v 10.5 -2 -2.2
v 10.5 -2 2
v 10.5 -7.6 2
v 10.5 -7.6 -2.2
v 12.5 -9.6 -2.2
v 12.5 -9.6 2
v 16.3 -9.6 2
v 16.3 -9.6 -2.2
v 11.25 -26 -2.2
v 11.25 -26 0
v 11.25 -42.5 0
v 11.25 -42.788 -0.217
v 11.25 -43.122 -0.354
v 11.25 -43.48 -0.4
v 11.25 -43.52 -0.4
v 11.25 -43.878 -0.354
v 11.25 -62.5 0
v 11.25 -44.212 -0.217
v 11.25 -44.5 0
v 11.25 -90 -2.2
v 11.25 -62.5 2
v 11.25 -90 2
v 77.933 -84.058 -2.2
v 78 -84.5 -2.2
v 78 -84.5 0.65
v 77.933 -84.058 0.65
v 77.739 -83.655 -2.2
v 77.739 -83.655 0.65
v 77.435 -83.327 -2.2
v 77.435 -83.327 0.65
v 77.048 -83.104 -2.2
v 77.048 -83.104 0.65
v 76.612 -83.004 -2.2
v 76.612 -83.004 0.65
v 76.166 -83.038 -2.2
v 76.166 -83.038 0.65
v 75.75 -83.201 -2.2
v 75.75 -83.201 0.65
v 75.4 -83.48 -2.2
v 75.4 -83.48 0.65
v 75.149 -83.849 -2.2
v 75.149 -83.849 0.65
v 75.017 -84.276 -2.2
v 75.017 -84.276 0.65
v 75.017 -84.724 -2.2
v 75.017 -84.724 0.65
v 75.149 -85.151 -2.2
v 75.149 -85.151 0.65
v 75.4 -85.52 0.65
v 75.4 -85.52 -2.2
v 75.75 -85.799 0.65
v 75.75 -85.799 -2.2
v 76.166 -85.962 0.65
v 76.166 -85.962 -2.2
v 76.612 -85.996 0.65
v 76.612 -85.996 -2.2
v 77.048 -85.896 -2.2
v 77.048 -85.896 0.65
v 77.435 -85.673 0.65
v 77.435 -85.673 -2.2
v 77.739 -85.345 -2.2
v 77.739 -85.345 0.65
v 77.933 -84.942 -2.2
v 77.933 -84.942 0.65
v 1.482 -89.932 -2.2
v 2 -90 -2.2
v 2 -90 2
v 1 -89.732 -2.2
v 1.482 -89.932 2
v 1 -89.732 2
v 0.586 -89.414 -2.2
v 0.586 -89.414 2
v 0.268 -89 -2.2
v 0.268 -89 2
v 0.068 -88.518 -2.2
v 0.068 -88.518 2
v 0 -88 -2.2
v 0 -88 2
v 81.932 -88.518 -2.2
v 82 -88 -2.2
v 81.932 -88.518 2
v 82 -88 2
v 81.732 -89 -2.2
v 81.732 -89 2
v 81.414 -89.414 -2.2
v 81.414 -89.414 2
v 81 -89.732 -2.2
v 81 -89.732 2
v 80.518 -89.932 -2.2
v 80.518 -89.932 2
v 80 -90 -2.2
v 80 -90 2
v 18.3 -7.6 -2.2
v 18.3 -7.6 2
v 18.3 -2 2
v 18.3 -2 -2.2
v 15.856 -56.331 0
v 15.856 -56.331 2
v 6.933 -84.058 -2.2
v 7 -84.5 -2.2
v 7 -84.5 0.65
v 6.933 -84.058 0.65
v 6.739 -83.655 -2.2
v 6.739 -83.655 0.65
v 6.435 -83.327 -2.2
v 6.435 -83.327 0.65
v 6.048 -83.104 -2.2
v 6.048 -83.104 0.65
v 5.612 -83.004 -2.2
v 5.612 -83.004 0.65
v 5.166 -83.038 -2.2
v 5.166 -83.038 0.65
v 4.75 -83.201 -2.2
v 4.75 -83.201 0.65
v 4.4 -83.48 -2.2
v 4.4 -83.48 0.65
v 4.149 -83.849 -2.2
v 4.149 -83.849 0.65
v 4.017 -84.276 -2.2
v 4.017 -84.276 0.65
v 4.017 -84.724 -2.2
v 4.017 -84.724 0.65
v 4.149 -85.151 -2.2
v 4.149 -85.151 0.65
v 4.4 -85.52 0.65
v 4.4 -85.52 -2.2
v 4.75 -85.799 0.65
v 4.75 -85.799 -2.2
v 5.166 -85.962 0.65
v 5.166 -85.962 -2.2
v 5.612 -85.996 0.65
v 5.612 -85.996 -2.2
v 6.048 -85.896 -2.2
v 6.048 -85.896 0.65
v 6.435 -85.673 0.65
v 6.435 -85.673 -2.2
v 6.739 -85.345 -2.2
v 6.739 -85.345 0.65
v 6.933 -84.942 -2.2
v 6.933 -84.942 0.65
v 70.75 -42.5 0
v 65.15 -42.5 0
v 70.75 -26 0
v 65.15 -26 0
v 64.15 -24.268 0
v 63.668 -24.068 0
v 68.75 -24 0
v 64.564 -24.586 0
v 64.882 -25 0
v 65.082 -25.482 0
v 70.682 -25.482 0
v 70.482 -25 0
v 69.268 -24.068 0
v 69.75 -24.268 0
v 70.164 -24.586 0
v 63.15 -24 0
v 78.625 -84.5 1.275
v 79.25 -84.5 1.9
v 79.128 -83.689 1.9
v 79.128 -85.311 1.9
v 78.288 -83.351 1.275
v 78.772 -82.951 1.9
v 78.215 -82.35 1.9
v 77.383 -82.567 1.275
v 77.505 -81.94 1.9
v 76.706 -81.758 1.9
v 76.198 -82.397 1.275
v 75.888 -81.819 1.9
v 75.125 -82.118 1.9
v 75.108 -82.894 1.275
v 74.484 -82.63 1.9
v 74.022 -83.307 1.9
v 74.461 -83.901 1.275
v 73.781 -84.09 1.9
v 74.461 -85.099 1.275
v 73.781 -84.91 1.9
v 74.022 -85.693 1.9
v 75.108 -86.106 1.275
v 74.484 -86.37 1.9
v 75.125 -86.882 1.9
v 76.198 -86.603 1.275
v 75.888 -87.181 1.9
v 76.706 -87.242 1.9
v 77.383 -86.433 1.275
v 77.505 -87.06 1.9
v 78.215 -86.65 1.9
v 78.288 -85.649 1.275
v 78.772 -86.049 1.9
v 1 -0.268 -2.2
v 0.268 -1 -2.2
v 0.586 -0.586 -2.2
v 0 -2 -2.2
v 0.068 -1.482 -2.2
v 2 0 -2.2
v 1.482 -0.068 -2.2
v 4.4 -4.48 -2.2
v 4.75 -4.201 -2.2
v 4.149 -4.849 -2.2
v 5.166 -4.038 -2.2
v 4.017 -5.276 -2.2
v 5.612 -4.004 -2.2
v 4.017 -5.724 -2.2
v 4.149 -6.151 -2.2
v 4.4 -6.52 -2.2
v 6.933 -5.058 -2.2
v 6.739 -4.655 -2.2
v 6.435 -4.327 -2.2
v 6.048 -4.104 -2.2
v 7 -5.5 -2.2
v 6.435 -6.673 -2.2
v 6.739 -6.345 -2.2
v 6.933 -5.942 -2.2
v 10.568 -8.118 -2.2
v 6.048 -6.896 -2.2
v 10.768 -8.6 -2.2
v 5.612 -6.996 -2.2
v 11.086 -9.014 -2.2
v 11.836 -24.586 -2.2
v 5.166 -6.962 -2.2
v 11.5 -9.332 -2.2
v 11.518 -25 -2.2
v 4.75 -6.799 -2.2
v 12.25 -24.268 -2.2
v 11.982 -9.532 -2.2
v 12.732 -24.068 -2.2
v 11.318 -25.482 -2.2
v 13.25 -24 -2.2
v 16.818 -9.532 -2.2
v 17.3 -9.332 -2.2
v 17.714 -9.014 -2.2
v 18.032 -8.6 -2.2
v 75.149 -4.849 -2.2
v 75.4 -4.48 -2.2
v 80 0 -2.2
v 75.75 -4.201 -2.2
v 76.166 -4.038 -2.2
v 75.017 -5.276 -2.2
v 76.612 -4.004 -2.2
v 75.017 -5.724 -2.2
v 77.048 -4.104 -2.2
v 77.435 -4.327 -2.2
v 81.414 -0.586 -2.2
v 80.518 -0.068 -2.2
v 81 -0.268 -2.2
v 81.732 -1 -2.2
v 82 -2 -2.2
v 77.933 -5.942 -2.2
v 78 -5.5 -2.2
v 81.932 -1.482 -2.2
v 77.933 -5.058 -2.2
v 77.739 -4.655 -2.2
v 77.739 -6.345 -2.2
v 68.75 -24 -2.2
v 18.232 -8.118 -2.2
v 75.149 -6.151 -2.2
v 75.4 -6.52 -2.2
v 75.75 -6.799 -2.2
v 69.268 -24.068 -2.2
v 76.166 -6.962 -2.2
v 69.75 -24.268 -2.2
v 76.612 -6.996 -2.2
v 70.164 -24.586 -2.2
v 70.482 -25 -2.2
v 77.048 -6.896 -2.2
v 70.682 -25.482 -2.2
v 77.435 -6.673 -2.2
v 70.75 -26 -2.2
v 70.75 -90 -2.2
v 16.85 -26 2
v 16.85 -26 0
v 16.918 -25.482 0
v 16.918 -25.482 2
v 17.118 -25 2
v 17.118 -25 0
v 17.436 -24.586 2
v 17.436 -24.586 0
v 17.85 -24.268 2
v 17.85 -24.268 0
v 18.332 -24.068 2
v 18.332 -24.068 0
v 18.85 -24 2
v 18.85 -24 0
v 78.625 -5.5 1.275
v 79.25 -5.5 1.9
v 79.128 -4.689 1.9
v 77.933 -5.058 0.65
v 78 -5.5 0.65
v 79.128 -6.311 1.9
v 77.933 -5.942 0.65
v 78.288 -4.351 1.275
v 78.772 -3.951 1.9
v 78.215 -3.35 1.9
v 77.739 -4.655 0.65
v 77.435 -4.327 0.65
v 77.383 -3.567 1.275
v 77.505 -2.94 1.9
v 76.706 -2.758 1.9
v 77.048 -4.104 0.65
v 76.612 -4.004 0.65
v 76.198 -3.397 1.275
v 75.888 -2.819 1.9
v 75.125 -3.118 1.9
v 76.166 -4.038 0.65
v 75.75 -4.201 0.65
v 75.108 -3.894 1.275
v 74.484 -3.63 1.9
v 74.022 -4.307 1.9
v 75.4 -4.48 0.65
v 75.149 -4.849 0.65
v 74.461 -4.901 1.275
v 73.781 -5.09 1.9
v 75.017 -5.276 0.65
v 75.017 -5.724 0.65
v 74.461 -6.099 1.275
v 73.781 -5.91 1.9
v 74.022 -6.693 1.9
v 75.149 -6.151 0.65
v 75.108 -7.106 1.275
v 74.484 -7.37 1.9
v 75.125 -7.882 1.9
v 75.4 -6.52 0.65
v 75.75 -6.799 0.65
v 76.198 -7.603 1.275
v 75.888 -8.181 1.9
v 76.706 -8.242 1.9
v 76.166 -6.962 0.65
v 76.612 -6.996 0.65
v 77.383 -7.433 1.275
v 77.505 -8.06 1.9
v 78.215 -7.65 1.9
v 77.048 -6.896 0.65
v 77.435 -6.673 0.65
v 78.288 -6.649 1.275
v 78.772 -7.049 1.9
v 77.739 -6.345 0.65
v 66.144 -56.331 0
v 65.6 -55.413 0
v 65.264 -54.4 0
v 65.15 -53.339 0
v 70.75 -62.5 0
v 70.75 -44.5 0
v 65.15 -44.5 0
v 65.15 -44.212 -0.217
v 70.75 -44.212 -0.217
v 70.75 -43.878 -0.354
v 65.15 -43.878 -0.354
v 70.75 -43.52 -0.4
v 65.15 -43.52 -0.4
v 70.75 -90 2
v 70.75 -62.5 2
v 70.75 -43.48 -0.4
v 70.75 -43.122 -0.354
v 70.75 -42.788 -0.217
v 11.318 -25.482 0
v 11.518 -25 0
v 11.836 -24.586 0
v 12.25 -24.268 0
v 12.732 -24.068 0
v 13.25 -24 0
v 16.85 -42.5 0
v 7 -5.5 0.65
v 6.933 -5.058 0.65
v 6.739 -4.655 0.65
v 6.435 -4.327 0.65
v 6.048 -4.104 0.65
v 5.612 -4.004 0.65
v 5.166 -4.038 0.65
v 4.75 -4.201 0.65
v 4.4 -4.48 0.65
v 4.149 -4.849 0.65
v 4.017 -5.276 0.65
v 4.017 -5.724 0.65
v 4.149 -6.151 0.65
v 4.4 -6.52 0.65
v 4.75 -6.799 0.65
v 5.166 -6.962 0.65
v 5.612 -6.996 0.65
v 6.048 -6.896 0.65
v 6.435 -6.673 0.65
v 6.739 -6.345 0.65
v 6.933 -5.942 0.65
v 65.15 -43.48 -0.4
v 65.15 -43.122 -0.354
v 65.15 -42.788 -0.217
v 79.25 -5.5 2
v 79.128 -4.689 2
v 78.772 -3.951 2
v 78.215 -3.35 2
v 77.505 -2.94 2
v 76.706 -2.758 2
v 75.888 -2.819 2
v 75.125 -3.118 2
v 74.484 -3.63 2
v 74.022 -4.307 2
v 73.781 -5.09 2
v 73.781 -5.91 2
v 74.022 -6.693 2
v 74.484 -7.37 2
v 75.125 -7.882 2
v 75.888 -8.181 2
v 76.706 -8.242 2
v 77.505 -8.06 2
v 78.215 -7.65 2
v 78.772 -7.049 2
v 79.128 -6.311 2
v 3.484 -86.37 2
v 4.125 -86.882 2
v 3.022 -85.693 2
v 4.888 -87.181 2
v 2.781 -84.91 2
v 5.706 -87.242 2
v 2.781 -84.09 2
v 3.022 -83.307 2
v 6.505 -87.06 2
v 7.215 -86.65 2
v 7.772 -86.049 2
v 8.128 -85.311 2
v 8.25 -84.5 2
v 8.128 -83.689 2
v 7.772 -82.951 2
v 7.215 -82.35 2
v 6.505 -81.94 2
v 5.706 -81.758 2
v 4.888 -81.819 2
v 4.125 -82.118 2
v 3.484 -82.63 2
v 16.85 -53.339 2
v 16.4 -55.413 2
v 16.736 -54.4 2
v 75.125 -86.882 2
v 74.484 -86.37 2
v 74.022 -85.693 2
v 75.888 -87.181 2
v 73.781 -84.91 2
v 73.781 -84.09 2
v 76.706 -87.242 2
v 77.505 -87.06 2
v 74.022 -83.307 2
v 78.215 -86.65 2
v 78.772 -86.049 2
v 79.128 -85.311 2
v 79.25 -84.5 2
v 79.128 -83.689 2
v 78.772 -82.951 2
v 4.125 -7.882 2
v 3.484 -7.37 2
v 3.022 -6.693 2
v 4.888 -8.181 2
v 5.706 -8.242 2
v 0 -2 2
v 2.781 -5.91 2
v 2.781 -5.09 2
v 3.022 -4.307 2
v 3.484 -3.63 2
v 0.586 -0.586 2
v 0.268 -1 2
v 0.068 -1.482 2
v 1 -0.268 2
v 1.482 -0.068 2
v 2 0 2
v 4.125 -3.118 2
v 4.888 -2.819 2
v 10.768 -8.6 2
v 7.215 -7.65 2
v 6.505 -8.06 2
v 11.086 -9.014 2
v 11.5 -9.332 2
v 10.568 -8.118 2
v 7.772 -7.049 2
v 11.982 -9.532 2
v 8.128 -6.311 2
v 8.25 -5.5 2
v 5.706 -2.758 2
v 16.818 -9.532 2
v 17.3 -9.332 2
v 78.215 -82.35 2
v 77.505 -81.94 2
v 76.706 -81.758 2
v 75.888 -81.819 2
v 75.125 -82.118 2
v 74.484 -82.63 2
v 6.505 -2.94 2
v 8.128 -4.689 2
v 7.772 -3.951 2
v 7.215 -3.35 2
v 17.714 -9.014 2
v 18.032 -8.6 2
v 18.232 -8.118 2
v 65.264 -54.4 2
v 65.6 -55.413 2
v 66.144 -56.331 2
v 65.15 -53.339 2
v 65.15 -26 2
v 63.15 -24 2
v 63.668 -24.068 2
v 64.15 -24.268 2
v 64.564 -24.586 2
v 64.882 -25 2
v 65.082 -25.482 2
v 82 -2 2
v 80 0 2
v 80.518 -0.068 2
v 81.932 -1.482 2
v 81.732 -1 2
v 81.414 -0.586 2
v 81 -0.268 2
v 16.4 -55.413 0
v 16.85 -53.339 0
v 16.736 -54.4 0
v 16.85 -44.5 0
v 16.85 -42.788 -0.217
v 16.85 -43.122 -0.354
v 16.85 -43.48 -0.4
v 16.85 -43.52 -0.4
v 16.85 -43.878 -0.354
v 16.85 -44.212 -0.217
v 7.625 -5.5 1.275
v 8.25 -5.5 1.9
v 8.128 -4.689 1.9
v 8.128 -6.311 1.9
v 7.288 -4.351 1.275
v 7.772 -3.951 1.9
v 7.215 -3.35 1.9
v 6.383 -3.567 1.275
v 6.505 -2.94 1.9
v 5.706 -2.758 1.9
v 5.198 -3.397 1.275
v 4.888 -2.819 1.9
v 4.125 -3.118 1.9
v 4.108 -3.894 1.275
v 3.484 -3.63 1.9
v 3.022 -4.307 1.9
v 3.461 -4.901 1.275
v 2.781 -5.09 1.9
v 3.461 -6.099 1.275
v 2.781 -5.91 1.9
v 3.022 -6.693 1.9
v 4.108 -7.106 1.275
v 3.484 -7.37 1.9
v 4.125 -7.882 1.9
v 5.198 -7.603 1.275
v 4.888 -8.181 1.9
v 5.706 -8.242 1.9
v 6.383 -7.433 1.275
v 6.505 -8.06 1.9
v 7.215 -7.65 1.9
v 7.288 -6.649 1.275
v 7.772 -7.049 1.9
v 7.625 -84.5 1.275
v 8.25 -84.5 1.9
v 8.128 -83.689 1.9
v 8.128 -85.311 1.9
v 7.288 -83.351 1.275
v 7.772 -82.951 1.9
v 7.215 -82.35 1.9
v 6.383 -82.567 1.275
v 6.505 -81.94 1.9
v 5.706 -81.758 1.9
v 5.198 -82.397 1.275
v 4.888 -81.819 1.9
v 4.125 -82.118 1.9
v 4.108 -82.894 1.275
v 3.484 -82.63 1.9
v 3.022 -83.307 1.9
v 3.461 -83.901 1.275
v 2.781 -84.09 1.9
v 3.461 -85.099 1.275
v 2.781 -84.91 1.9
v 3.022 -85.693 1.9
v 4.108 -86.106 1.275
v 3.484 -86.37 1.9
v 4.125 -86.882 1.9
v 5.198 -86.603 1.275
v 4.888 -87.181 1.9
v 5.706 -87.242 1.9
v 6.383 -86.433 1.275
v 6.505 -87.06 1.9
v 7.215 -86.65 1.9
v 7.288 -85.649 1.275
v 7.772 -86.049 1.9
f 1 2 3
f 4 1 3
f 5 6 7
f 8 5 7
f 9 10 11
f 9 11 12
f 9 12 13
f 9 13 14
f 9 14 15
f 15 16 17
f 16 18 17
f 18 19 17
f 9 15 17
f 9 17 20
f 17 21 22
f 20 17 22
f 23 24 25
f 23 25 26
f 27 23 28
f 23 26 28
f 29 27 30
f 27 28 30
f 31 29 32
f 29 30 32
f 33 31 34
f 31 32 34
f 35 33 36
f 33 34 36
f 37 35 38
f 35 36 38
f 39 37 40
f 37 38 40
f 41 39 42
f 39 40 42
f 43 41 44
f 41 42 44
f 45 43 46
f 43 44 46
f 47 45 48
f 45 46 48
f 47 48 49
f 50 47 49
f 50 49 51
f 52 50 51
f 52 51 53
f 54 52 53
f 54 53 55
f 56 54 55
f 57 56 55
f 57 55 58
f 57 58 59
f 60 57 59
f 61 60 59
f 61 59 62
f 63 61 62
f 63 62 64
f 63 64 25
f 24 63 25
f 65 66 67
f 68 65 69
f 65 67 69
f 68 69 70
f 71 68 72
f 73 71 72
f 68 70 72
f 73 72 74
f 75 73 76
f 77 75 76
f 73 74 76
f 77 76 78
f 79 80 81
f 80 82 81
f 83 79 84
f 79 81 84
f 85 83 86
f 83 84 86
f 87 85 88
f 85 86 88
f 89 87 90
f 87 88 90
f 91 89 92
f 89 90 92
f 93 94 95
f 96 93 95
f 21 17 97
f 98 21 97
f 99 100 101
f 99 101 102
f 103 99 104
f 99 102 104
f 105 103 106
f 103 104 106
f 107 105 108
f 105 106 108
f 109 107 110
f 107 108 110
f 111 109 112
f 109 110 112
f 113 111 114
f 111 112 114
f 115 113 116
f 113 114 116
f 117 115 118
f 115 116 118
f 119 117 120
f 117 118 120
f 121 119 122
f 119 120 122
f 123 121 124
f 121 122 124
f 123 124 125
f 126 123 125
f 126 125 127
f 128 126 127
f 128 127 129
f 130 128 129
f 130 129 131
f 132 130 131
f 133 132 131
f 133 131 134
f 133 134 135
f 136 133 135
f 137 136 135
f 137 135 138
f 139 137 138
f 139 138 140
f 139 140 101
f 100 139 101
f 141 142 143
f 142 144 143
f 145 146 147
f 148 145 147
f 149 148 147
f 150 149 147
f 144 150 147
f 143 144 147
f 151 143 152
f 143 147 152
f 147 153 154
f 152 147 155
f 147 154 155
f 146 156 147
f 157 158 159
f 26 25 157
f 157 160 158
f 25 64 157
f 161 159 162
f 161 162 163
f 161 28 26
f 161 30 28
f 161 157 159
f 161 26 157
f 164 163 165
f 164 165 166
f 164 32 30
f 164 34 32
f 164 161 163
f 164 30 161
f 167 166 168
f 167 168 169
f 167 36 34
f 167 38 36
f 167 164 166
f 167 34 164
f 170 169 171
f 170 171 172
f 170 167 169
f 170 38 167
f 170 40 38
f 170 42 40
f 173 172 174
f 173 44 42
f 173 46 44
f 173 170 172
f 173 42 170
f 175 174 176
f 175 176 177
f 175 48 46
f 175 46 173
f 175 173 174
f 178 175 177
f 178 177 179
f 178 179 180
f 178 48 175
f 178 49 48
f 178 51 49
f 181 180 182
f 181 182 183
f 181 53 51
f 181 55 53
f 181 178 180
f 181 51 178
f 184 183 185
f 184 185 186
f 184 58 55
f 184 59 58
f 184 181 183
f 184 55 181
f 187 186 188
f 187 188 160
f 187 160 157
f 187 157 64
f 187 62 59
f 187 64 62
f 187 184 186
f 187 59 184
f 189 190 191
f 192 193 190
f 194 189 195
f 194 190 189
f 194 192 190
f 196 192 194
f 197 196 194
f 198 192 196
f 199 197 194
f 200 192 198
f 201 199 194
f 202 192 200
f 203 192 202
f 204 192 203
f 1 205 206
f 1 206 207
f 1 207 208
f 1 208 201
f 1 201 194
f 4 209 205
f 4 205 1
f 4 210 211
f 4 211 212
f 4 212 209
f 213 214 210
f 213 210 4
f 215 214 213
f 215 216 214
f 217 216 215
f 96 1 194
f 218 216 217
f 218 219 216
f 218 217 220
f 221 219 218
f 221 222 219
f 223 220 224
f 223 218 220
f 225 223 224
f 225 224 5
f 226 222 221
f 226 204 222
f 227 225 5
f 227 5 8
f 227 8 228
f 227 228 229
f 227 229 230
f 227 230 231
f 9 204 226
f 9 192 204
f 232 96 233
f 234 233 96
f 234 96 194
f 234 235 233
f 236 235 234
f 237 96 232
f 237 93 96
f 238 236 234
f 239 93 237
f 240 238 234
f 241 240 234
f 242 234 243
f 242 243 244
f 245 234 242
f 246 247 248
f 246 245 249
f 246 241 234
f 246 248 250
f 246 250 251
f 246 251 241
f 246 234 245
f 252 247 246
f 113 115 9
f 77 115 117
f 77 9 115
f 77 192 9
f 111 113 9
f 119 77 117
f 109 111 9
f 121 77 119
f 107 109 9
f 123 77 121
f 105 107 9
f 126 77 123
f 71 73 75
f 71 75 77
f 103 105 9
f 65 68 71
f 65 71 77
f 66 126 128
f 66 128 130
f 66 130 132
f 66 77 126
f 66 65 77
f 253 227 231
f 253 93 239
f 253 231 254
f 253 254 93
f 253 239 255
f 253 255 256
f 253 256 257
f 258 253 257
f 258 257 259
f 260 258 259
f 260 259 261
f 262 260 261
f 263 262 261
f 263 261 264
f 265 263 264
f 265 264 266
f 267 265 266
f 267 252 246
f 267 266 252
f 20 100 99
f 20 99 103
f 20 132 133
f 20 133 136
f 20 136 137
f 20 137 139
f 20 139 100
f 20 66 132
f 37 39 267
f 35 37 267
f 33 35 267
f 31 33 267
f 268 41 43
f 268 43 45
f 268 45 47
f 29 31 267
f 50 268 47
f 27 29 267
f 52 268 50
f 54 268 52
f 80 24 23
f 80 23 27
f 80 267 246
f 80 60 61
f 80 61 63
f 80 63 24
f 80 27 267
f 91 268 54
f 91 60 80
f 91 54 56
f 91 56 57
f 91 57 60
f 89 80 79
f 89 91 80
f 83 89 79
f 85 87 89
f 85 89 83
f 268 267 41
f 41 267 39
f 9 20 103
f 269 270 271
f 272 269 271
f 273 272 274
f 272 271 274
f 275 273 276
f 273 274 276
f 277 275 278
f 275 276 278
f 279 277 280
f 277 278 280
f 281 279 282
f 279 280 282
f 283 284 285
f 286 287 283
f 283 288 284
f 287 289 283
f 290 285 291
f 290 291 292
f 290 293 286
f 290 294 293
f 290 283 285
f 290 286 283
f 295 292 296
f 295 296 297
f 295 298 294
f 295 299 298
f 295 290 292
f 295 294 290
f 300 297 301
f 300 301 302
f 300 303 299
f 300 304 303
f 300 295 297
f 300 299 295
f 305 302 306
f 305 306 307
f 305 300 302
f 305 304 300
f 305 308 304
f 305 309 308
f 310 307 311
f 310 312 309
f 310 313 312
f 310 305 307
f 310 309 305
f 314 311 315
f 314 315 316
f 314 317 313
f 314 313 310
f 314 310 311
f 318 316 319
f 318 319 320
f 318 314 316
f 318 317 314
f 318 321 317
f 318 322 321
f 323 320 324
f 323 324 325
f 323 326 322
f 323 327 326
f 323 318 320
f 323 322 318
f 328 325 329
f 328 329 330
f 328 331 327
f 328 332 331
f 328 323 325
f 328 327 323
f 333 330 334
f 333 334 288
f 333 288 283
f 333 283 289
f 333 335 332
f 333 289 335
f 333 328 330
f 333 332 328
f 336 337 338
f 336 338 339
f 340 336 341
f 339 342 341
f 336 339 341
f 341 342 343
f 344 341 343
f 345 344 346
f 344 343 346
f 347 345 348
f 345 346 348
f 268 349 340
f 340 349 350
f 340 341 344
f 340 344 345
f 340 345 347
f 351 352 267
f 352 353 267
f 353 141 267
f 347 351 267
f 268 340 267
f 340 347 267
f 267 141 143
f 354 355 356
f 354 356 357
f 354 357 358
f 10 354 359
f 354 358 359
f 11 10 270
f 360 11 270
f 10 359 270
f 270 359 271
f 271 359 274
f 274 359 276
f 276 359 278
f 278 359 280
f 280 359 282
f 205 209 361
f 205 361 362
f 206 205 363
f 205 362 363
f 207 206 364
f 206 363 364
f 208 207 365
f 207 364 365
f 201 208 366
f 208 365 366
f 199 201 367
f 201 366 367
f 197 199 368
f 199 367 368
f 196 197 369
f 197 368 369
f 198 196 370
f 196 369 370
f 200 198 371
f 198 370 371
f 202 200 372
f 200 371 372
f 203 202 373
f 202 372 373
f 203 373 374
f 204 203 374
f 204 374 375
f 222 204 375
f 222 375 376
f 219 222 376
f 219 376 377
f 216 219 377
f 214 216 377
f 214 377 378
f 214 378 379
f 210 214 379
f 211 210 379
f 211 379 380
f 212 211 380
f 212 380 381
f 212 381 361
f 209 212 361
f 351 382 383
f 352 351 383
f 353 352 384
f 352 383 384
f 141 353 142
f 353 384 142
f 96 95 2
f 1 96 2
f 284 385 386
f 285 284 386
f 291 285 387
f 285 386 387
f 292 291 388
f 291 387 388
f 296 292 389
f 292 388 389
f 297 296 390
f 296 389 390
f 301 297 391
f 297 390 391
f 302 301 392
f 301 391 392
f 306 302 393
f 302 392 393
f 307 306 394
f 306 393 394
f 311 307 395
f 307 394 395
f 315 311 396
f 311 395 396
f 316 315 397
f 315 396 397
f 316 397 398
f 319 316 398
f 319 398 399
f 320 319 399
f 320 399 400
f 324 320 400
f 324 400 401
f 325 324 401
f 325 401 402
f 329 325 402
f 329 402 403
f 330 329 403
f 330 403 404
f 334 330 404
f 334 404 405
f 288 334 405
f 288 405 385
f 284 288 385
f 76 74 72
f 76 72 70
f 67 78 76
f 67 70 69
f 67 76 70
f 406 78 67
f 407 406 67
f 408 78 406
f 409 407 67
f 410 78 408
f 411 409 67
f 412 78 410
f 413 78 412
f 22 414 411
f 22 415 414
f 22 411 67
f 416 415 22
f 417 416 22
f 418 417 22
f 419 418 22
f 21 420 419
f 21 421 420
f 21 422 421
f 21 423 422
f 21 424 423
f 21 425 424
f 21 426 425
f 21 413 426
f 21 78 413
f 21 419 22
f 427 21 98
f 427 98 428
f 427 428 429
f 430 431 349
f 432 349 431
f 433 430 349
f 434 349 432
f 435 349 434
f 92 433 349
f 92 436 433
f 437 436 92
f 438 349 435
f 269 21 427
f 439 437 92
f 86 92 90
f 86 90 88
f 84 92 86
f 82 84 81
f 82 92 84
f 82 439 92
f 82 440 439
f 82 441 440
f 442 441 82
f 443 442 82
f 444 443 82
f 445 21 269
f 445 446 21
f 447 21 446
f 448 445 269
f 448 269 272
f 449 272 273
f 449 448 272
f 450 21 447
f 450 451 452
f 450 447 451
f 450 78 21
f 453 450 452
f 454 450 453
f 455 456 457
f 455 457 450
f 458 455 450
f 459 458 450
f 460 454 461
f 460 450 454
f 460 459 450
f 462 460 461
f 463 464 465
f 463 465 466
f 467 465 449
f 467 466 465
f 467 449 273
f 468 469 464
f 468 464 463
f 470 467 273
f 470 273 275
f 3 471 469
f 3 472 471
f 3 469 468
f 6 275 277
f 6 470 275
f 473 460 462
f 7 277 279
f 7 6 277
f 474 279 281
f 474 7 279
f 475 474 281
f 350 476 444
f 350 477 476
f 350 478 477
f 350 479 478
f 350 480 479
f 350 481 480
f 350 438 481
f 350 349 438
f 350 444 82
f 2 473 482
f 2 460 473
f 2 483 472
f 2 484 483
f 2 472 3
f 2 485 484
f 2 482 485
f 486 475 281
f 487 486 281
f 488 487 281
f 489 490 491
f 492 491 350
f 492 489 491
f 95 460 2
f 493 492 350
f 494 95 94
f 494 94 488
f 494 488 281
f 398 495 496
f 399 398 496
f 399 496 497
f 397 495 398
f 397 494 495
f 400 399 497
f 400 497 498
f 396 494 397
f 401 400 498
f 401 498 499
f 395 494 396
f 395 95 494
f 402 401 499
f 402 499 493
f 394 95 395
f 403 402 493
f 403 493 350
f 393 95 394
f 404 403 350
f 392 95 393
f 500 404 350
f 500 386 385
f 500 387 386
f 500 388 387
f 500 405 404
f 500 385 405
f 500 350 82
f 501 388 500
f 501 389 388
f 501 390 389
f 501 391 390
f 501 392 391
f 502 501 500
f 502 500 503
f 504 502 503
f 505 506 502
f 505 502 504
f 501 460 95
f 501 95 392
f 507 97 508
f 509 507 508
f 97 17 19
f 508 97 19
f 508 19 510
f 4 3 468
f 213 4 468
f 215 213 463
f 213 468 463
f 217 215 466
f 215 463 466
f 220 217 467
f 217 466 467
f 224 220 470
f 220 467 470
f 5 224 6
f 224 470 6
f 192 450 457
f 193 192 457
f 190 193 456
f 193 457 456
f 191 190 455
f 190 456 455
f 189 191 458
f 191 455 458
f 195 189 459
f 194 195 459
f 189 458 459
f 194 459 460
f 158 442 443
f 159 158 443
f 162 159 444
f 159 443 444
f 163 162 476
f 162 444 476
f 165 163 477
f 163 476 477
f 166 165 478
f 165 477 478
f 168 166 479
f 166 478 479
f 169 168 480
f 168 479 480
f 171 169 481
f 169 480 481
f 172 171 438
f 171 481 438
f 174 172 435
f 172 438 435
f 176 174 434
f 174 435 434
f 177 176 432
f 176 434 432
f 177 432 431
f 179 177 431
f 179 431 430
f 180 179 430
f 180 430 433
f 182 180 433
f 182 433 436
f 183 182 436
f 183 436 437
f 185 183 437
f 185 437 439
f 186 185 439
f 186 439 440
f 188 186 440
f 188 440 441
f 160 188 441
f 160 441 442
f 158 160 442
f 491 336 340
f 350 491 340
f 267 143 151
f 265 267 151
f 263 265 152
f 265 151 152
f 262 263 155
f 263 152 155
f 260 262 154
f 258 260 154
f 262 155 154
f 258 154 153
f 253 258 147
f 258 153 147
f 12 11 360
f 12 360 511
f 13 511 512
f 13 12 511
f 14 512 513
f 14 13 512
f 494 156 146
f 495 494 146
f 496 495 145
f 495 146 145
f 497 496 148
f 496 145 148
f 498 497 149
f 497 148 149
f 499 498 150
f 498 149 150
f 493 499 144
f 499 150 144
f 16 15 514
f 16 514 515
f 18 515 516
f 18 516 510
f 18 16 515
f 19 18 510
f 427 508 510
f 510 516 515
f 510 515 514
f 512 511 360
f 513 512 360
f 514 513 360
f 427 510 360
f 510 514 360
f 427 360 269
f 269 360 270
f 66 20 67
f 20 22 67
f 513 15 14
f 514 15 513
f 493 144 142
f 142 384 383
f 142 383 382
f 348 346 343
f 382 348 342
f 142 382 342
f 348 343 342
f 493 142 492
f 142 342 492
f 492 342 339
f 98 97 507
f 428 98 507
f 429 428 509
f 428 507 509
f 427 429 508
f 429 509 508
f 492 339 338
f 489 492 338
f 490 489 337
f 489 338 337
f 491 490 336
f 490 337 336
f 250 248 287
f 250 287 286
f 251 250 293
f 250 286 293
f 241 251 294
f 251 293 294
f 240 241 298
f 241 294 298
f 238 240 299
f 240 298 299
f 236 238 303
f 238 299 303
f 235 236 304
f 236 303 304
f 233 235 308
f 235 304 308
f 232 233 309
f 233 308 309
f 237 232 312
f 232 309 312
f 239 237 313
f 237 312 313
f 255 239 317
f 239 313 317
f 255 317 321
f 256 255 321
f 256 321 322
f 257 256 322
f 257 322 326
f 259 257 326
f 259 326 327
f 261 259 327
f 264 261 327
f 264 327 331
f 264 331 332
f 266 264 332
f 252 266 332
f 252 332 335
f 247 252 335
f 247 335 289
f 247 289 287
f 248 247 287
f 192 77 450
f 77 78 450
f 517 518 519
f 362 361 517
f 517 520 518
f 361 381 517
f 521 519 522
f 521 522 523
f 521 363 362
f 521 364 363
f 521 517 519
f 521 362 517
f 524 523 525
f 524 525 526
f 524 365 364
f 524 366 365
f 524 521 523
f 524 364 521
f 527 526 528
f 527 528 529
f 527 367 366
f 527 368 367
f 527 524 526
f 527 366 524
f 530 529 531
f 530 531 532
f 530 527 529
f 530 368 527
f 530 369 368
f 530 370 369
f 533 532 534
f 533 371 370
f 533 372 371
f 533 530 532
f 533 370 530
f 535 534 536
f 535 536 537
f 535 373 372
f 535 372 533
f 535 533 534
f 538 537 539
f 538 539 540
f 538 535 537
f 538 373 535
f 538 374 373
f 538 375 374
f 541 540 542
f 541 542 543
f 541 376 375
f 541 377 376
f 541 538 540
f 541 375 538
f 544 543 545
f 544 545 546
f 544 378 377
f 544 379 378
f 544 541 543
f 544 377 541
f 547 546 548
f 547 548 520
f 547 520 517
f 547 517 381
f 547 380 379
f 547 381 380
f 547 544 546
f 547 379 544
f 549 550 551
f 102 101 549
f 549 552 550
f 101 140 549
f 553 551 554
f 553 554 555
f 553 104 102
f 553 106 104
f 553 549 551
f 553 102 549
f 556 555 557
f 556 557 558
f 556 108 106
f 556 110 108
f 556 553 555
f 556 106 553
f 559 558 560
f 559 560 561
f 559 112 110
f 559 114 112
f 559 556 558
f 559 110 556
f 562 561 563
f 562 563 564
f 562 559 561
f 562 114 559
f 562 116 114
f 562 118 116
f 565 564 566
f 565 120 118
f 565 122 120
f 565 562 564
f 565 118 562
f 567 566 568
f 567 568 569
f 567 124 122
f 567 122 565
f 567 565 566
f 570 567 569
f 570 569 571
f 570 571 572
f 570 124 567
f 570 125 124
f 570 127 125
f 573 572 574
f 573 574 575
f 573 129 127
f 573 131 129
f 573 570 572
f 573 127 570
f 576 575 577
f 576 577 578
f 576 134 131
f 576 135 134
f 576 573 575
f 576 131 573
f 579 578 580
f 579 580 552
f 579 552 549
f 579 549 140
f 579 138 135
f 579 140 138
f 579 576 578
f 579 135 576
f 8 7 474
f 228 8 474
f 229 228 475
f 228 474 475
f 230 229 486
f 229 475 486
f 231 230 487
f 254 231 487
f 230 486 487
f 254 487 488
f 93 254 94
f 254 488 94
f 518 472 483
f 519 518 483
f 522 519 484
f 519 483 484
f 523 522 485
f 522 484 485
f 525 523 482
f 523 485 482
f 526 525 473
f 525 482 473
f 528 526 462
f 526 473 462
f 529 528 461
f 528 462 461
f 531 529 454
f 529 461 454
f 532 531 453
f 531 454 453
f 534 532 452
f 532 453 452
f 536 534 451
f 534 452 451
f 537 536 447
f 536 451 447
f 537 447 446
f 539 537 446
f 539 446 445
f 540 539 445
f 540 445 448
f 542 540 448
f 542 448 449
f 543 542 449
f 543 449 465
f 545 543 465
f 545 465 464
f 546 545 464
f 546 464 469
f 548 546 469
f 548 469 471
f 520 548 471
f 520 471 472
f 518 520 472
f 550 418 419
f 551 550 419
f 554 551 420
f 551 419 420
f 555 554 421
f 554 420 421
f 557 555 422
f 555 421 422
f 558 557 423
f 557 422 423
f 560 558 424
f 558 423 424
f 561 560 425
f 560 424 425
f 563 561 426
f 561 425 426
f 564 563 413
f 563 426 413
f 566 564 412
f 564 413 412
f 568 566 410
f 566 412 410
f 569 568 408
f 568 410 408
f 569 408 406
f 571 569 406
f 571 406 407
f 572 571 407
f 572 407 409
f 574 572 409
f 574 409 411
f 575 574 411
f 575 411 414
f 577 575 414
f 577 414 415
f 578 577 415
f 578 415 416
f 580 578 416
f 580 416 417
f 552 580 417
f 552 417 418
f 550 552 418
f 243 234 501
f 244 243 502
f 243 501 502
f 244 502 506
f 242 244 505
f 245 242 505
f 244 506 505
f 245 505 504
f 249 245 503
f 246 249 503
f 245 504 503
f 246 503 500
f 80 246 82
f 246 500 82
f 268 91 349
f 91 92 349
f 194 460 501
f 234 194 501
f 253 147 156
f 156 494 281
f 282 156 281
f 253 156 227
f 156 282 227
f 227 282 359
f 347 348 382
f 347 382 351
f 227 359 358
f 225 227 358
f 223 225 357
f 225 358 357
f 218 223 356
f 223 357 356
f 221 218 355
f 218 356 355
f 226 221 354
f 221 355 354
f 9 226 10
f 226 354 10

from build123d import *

# Parameters (mm, degrees)
F1_DEPTH      = 2
F3_DEPTH      = 2.2
F5_DEPTH      = 25
F6_R          = 1.5
F7_DEPTH      = 4.2
F8_R          = 2.75
F9_DEPTH      = 1.6
F10_S5_R      = 1.5
F10_T6_DEPTH  = 5
F10_S11_R     = 1.5
F10_T12_DEPTH = 5
F10_S17_R     = 1.5
F10_T18_DEPTH = 5
F10_S23_R     = 1.5
F10_T24_DEPTH = 5
F11_W         = 5.6
F11_H         = 2
F12_DEPTH     = 0.4
F13_T1_DEPTH  = 8.0494897428
F13_T3_DEPTH  = 8.0494897428


# Not quite as in the source:
# - a fillet or chamfer that OpenCascade refuses, or shapes differently, is made with other operations: its cross-section is extruded or revolved along the edge and cut away or added


with BuildPart() as f1:
    # F0 (on Top) → F1 (new body)
    with BuildSketch(Plane.XY):
        with BuildLine():
            Line((80, 0), (2, 0))
            ThreePointArc((2, 0), (0.5857864376, -0.5857864376), (0, -2))
            Line((0, -2), (0, -88))
            ThreePointArc((0, -88), (0.5857864376, -89.4142135624), (2, -90))
            Line((2, -90), (11.25, -90))
            Line((11.25, -90), (11.25, -62.5))
            Line((11.25, -62.5), (15.8564011104, -56.3307127986))
            ThreePointArc((15.8564011104, -56.3307127986), (16.5951030311, -54.9153368199), (16.85, -53.3392666362))
            Line((16.85, -53.3392666362), (16.85, -26))
            ThreePointArc((16.85, -26), (17.4357864376, -24.5857864376), (18.85, -24))
            Line((18.85, -24), (63.15, -24))
            ThreePointArc((63.15, -24), (64.5642135624, -24.5857864376), (65.15, -26))
            Line((65.15, -26), (65.15, -53.3392666362))
            ThreePointArc((65.15, -53.3392666362), (65.4048969689, -54.9153368199), (66.1435988896, -56.3307127986))
            Line((66.1435988896, -56.3307127986), (70.75, -62.5))
            Line((70.75, -62.5), (70.75, -90))
            Line((70.75, -90), (80, -90))
            ThreePointArc((80, -90), (81.4142135624, -89.4142135624), (82, -88))
            Line((82, -88), (82, -2))
            ThreePointArc((82, -2), (81.4142135624, -0.5857864376), (80, 0))
        make_face()
    extrude(amount=F1_DEPTH)

    # F2 (on face) → F3 (join)
    with BuildSketch(Plane(origin=(0, 0, 0), x_dir=(1, 0, 0), z_dir=(0, 0, -1))):
        with BuildLine():
            ThreePointArc((80, 0), (81.4142135624, 0.5857864376), (82, 2))
            Line((82, 2), (82, 88))
            ThreePointArc((82, 88), (81.4142135624, 89.4142135624), (80, 90))
            Line((80, 90), (70.75, 90))
            Line((70.75, 90), (70.75, 62.5))
            Line((70.75, 62.5), (70.75, 26))
            ThreePointArc((70.75, 26), (70.1642135624, 24.5857864376), (68.75, 24))
            Line((68.75, 24), (65.15, 24))
            Line((65.15, 24), (16.85, 24))
            Line((16.85, 24), (13.25, 24))
            ThreePointArc((13.25, 24), (11.8357864376, 24.5857864376), (11.25, 26))
            Line((11.25, 26), (11.25, 62.5))
            Line((11.25, 62.5), (11.25, 90))
            Line((11.25, 90), (2, 90))
            ThreePointArc((2, 90), (0.5857864376, 89.4142135624), (0, 88))
            Line((0, 88), (0, 2))
            ThreePointArc((0, 2), (0.5857864376, 0.5857864376), (2, 0))
            Line((2, 0), (80, 0))
        make_face()
    extrude(amount=F3_DEPTH)

    # F4 (on face) → F5 (cut)
    with BuildSketch(Plane.XY.offset(2)):
        with BuildLine():
            Line((18.3, -2), (10.5, -2))
            Line((10.5, -2), (10.5, -7.6))
            ThreePointArc((10.5, -7.6), (11.0857864376, -9.0142135624), (12.5, -9.6))
            Line((12.5, -9.6), (16.3, -9.6))
            ThreePointArc((16.3, -9.6), (17.7142135624, -9.0142135624), (18.3, -7.6))
            Line((18.3, -7.6), (18.3, -2))
        make_face()
    extrude(amount=-F5_DEPTH, mode=Mode.SUBTRACT)

    # F6 (on face) → F7 (cut)
    with BuildSketch(Plane.XY.offset(2)):
        with Locations((5.5, -84.5)):
            Circle(F6_R)
        with Locations((76.5, -84.5)):
            Circle(F6_R)
        with Locations((5.5, -5.5)):
            Circle(F6_R)
        with Locations((76.5, -5.5)):
            Circle(F6_R)
    extrude(amount=-F7_DEPTH, mode=Mode.SUBTRACT)

    # F8 (on face) → F9 (cut)
    with BuildSketch(Plane.XY.offset(2)):
        with Locations((5.5, -5.5)):
            Circle(F8_R)
        with Locations((76.5, -5.5)):
            Circle(F8_R)
        with Locations((76.5, -84.5)):
            Circle(F8_R)
        with Locations((5.5, -84.5)):
            Circle(F8_R)
    extrude(amount=-F9_DEPTH, mode=Mode.SUBTRACT)

    # F10: chamfer of 1.5 on 4 edges, made by hand


with BuildPart() as f10_tool2:
    # F10_s3 → F10_t4 (revolve)
    with BuildSketch(Plane.XZ.offset(84.5)):
        Polygon((8.25, 1.9), (6.75, 0.4), (8.25, 0.4), align=None)
    revolve(axis=Axis((5.5, -84.5, 0.4), (0, 0, 1)))

    # F10_s5 → F10_t6 (cut, symmetric)
    with BuildSketch(Plane.XY.offset(1.1)):
        with Locations((5.5, -84.5)):
            Circle(F10_S5_R)
    extrude(amount=F10_T6_DEPTH, both=True, mode=Mode.SUBTRACT)


with BuildPart() as f1_1:
    add(f1.part)

    # F10_t1: union F10_tool2
    add(f10_tool2.part)


with BuildPart() as f10_tool8:
    # F10_s9 → F10_t10 (revolve)
    with BuildSketch(Plane.XZ.offset(84.5)):
        Polygon((79.25, 1.9), (77.75, 0.4), (79.25, 0.4), align=None)
    revolve(axis=Axis((76.5, -84.5, 0.4), (0, 0, 1)))

    # F10_s11 → F10_t12 (cut, symmetric)
    with BuildSketch(Plane.XY.offset(1.1)):
        with Locations((76.5, -84.5)):
            Circle(F10_S11_R)
    extrude(amount=F10_T12_DEPTH, both=True, mode=Mode.SUBTRACT)


with BuildPart() as f1_2:
    add(f1_1.part)

    # F10_t7: union F10_tool8
    add(f10_tool8.part)


with BuildPart() as f10_tool14:
    # F10_s15 → F10_t16 (revolve)
    with BuildSketch(Plane.XZ.offset(5.5)):
        Polygon((8.25, 1.9), (6.75, 0.4), (8.25, 0.4), align=None)
    revolve(axis=Axis((5.5, -5.5, 0.4), (0, 0, 1)))

    # F10_s17 → F10_t18 (cut, symmetric)
    with BuildSketch(Plane.XY.offset(1.1)):
        with Locations((5.5, -5.5)):
            Circle(F10_S17_R)
    extrude(amount=F10_T18_DEPTH, both=True, mode=Mode.SUBTRACT)


with BuildPart() as f1_3:
    add(f1_2.part)

    # F10_t13: union F10_tool14
    add(f10_tool14.part)


with BuildPart() as f10_tool20:
    # F10_s21 → F10_t22 (revolve)
    with BuildSketch(Plane.XZ.offset(5.5)):
        Polygon((79.25, 1.9), (77.75, 0.4), (79.25, 0.4), align=None)
    revolve(axis=Axis((76.5, -5.5, 0.4), (0, 0, 1)))

    # F10_s23 → F10_t24 (cut, symmetric)
    with BuildSketch(Plane.XY.offset(1.1)):
        with Locations((76.5, -5.5)):
            Circle(F10_S23_R)
    extrude(amount=F10_T24_DEPTH, both=True, mode=Mode.SUBTRACT)


with BuildPart() as f1_4:
    add(f1_3.part)

    # F10_t19: union F10_tool20
    add(f10_tool20.part)

    # F11 (on face) → F12 (join)
    with BuildSketch(Plane(origin=(0, 0, 0), x_dir=(1, 0, 0), z_dir=(0, 0, -1))):
        with Locations((14.05, 43.5)):
            Rectangle(F11_W, F11_H)
        with Locations((67.95, 43.5)):
            Rectangle(F11_W, F11_H)
    extrude(amount=F12_DEPTH)

    # F13: fillet of radius 1.4 on 4 edges, made by hand

    # F13_s2 → F13_t1 (cut)
    with BuildSketch(Plane.YZ.offset(11.25)):
        with BuildLine():
            ThreePointArc((-42.5, 0), (-42.9506456349, -0.2961481397), (-43.4797958971, -0.4))
            Line((-43.4797958971, -0.4), (-42.5, -0.4))
            Line((-42.5, -0.4), (-42.5, 0))
        make_face()
        with BuildLine():
            ThreePointArc((-43.5202041029, -0.4), (-44.0493543651, -0.2961481397), (-44.5, 0))
            Line((-44.5, 0), (-44.5, -0.4))
            Line((-44.5, -0.4), (-43.5202041029, -0.4))
        make_face()
    extrude(amount=F13_T1_DEPTH, mode=Mode.SUBTRACT)

    # F13_s4 → F13_t3 (cut)
    with BuildSketch(Plane.YZ.offset(62.7005102572)):
        with BuildLine():
            ThreePointArc((-43.4797958971, -0.4), (-42.9506456349, -0.2961481397), (-42.5, 0))
            Line((-42.5, 0), (-42.5, -0.4))
            Line((-42.5, -0.4), (-43.4797958971, -0.4))
        make_face()
        with BuildLine():
            ThreePointArc((-44.5, 0), (-44.0493543651, -0.2961481397), (-43.5202041029, -0.4))
            Line((-43.5202041029, -0.4), (-44.5, -0.4))
            Line((-44.5, -0.4), (-44.5, 0))
        make_face()
    extrude(amount=F13_T3_DEPTH, mode=Mode.SUBTRACT)


solid = f1_4.part
